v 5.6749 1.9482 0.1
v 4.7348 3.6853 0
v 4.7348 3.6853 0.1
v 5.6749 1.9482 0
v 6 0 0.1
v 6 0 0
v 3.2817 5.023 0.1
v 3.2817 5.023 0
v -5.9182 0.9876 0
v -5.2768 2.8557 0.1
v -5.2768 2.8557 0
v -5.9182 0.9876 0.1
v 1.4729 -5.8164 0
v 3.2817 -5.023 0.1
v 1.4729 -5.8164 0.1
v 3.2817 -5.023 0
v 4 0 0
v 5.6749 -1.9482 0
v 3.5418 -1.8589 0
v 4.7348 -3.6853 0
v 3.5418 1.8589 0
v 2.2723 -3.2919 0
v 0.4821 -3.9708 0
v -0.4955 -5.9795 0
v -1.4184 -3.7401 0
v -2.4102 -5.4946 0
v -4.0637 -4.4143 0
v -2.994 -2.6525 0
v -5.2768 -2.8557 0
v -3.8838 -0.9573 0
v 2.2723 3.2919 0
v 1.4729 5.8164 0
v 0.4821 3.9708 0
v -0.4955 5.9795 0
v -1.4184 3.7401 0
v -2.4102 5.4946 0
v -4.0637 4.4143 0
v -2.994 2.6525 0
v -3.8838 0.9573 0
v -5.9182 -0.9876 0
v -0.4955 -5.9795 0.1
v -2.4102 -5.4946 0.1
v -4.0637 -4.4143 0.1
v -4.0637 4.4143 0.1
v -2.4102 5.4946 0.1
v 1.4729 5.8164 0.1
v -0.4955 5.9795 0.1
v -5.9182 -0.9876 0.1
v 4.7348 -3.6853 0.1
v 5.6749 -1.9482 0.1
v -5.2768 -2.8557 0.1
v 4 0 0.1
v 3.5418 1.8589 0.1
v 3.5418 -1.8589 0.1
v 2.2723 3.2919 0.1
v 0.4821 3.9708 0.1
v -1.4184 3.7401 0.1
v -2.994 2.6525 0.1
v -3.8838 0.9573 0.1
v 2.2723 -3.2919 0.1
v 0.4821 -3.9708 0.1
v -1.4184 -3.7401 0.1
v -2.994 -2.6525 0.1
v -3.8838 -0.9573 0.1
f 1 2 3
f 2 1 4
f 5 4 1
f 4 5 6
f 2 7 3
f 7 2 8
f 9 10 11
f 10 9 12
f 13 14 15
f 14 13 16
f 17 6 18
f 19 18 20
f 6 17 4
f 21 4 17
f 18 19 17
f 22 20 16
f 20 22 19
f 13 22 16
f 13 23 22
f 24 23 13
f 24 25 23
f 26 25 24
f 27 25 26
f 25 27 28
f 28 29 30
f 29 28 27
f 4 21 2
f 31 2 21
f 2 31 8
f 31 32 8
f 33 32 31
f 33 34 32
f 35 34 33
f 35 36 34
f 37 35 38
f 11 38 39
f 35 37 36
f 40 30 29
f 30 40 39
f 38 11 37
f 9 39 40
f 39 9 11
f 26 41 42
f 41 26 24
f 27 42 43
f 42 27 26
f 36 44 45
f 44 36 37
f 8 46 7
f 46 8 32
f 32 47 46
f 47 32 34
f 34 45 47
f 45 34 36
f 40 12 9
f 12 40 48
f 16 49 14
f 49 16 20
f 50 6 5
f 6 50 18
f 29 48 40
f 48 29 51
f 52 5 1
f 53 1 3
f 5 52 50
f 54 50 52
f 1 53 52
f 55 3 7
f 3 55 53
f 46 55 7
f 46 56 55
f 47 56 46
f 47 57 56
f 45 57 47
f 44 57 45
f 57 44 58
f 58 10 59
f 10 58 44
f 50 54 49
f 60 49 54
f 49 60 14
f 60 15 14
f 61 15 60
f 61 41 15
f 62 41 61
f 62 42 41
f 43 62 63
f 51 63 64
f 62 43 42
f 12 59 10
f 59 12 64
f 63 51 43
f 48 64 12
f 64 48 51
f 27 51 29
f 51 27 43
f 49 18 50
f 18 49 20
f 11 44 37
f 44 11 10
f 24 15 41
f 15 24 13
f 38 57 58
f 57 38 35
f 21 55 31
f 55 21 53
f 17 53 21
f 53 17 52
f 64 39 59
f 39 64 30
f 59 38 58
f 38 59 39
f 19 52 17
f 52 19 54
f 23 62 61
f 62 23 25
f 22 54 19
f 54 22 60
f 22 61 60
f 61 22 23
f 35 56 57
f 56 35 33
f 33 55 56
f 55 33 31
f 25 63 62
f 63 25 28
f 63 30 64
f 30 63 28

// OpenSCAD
// part_id: a5
// name: A5 ring
// source_drawing_ids: DRW-001
// units: mm
// revision: 0.1-placeholder
// SPDX-License-Identifier: MIT

module part_a5(od = 12, id = 8, th = .1) {
    difference() {
        cylinder(d = od, h = th, center = false);
        translate([0, 0, -0.1]) cylinder(d = id, h = th + 0.2, center = false);
    }
}


// ---- "main guard" ----
// Default to previewing when opened directly:
if (is_undef(__LIB_MODE__)) {
    part_a5();
}
